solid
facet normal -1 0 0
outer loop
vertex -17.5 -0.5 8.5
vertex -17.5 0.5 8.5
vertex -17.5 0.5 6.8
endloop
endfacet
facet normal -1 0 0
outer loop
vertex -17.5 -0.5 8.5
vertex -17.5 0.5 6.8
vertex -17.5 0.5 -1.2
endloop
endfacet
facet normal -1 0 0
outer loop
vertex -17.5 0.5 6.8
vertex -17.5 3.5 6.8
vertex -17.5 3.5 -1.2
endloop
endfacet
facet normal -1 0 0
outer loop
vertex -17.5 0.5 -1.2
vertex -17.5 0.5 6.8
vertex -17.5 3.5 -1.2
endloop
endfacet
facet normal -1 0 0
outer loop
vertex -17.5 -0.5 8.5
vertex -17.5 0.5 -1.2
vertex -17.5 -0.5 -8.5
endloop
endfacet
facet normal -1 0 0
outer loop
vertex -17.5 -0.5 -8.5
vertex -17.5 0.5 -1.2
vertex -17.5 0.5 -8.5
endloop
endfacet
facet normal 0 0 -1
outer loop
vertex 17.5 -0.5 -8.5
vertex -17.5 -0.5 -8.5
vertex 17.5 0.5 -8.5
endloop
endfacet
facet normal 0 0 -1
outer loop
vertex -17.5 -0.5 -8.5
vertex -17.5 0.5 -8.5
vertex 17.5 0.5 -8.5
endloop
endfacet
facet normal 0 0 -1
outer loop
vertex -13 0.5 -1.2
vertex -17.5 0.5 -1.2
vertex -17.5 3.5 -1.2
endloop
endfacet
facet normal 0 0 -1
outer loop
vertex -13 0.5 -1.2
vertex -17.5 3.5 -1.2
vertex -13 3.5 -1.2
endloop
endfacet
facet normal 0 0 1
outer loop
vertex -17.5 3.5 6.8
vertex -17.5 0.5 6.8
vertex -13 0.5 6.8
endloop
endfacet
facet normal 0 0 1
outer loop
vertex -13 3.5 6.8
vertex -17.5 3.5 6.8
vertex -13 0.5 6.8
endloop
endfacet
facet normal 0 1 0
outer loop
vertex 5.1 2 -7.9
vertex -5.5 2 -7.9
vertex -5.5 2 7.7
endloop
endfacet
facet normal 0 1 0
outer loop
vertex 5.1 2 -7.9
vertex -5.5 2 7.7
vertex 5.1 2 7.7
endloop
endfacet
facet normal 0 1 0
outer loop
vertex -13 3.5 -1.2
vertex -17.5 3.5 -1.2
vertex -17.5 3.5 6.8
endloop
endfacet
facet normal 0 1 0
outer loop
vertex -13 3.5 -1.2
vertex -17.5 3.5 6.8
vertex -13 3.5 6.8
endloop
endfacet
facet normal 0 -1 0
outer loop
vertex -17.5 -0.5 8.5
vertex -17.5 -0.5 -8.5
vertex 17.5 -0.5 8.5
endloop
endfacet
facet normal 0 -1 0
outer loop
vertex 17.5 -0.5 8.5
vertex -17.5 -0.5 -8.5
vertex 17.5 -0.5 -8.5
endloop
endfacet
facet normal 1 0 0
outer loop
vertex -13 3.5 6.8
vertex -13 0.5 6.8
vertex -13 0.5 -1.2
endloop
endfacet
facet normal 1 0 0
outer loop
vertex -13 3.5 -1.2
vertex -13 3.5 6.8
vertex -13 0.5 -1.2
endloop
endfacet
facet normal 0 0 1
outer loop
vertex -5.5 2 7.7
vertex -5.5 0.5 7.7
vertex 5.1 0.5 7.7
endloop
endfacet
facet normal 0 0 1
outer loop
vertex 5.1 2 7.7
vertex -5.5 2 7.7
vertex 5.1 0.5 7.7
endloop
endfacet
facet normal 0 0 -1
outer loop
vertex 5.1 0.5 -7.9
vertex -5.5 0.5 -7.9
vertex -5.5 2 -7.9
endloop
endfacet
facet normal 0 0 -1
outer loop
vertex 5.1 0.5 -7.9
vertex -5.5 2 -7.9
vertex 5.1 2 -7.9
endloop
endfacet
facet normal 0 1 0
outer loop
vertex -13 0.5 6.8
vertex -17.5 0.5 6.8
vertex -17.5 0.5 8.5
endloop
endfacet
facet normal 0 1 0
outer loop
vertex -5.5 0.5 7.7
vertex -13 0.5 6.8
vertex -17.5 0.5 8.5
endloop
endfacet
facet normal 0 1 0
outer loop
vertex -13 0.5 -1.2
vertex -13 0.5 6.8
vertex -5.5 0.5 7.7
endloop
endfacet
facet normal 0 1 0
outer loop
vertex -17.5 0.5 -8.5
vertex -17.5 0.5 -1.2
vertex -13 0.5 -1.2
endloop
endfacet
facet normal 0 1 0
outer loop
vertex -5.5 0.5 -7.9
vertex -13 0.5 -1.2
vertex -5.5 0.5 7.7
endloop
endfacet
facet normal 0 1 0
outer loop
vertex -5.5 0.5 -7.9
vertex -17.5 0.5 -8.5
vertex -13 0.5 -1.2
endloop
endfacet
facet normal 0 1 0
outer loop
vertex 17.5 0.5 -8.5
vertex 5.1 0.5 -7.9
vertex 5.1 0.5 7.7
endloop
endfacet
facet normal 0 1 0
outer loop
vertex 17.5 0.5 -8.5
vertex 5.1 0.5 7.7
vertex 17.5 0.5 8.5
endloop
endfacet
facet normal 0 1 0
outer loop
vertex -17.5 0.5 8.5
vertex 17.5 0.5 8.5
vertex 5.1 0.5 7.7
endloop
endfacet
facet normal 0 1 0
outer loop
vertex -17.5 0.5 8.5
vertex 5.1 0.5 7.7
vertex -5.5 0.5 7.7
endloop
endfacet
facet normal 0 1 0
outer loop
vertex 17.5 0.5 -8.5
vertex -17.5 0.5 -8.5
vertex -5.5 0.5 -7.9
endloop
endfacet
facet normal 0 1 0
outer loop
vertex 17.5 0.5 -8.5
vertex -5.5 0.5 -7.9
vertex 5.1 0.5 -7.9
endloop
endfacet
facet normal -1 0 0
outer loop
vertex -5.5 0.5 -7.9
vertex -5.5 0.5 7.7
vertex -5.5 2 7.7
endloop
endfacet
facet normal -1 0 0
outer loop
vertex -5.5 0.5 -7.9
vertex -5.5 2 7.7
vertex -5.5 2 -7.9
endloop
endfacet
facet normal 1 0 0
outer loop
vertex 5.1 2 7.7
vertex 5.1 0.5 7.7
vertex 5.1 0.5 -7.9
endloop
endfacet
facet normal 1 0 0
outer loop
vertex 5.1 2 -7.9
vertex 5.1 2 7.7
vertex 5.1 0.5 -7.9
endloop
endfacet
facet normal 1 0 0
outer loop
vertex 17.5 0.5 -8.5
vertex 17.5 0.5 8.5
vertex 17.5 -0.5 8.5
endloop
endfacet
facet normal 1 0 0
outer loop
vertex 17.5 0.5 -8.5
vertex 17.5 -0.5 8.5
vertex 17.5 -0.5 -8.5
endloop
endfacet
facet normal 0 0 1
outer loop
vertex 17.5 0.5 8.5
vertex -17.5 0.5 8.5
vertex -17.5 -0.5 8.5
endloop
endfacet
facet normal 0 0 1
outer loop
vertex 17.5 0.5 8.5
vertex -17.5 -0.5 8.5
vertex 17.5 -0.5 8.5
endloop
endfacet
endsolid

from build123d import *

# Parameters (mm, degrees)
SKETCH1_W           = 35
SKETCH1_H           = 17
BOSS_EXTRUDE1_DEPTH = 0.5
SKETCH2_W           = 4.5
SKETCH2_H           = 8
BOSS_EXTRUDE2_DEPTH = 3
SKETCH3_W           = 10.6
SKETCH3_H           = 15.6
BOSS_EXTRUDE3_DEPTH = 1.5


with BuildPart() as part:
    # Sketch1 → Boss-Extrude1 (new, symmetric)
    with BuildSketch(Plane(origin=(0, 0, 0), x_dir=(1, 0, 0), z_dir=(0, 1, 0))):
        Rectangle(SKETCH1_W, SKETCH1_H)
    extrude(amount=BOSS_EXTRUDE1_DEPTH, both=True)

    # Sketch2 → Boss-Extrude2 (add)
    with BuildSketch(Plane(origin=(0, 0.5, 0), x_dir=(1, 0, 0), z_dir=(0, 1, 0))):
        with Locations((-15.25, -2.8)):
            Rectangle(SKETCH2_W, SKETCH2_H)
    extrude(amount=BOSS_EXTRUDE2_DEPTH)

    # Sketch3 → Boss-Extrude3 (add)
    with BuildSketch(Plane(origin=(0, 0.5, 0), x_dir=(1, 0, 0), z_dir=(0, 1, 0))):
        with Locations((-0.2, 0.1)):
            Rectangle(SKETCH3_W, SKETCH3_H)
    extrude(amount=BOSS_EXTRUDE3_DEPTH)


solid = part.part
